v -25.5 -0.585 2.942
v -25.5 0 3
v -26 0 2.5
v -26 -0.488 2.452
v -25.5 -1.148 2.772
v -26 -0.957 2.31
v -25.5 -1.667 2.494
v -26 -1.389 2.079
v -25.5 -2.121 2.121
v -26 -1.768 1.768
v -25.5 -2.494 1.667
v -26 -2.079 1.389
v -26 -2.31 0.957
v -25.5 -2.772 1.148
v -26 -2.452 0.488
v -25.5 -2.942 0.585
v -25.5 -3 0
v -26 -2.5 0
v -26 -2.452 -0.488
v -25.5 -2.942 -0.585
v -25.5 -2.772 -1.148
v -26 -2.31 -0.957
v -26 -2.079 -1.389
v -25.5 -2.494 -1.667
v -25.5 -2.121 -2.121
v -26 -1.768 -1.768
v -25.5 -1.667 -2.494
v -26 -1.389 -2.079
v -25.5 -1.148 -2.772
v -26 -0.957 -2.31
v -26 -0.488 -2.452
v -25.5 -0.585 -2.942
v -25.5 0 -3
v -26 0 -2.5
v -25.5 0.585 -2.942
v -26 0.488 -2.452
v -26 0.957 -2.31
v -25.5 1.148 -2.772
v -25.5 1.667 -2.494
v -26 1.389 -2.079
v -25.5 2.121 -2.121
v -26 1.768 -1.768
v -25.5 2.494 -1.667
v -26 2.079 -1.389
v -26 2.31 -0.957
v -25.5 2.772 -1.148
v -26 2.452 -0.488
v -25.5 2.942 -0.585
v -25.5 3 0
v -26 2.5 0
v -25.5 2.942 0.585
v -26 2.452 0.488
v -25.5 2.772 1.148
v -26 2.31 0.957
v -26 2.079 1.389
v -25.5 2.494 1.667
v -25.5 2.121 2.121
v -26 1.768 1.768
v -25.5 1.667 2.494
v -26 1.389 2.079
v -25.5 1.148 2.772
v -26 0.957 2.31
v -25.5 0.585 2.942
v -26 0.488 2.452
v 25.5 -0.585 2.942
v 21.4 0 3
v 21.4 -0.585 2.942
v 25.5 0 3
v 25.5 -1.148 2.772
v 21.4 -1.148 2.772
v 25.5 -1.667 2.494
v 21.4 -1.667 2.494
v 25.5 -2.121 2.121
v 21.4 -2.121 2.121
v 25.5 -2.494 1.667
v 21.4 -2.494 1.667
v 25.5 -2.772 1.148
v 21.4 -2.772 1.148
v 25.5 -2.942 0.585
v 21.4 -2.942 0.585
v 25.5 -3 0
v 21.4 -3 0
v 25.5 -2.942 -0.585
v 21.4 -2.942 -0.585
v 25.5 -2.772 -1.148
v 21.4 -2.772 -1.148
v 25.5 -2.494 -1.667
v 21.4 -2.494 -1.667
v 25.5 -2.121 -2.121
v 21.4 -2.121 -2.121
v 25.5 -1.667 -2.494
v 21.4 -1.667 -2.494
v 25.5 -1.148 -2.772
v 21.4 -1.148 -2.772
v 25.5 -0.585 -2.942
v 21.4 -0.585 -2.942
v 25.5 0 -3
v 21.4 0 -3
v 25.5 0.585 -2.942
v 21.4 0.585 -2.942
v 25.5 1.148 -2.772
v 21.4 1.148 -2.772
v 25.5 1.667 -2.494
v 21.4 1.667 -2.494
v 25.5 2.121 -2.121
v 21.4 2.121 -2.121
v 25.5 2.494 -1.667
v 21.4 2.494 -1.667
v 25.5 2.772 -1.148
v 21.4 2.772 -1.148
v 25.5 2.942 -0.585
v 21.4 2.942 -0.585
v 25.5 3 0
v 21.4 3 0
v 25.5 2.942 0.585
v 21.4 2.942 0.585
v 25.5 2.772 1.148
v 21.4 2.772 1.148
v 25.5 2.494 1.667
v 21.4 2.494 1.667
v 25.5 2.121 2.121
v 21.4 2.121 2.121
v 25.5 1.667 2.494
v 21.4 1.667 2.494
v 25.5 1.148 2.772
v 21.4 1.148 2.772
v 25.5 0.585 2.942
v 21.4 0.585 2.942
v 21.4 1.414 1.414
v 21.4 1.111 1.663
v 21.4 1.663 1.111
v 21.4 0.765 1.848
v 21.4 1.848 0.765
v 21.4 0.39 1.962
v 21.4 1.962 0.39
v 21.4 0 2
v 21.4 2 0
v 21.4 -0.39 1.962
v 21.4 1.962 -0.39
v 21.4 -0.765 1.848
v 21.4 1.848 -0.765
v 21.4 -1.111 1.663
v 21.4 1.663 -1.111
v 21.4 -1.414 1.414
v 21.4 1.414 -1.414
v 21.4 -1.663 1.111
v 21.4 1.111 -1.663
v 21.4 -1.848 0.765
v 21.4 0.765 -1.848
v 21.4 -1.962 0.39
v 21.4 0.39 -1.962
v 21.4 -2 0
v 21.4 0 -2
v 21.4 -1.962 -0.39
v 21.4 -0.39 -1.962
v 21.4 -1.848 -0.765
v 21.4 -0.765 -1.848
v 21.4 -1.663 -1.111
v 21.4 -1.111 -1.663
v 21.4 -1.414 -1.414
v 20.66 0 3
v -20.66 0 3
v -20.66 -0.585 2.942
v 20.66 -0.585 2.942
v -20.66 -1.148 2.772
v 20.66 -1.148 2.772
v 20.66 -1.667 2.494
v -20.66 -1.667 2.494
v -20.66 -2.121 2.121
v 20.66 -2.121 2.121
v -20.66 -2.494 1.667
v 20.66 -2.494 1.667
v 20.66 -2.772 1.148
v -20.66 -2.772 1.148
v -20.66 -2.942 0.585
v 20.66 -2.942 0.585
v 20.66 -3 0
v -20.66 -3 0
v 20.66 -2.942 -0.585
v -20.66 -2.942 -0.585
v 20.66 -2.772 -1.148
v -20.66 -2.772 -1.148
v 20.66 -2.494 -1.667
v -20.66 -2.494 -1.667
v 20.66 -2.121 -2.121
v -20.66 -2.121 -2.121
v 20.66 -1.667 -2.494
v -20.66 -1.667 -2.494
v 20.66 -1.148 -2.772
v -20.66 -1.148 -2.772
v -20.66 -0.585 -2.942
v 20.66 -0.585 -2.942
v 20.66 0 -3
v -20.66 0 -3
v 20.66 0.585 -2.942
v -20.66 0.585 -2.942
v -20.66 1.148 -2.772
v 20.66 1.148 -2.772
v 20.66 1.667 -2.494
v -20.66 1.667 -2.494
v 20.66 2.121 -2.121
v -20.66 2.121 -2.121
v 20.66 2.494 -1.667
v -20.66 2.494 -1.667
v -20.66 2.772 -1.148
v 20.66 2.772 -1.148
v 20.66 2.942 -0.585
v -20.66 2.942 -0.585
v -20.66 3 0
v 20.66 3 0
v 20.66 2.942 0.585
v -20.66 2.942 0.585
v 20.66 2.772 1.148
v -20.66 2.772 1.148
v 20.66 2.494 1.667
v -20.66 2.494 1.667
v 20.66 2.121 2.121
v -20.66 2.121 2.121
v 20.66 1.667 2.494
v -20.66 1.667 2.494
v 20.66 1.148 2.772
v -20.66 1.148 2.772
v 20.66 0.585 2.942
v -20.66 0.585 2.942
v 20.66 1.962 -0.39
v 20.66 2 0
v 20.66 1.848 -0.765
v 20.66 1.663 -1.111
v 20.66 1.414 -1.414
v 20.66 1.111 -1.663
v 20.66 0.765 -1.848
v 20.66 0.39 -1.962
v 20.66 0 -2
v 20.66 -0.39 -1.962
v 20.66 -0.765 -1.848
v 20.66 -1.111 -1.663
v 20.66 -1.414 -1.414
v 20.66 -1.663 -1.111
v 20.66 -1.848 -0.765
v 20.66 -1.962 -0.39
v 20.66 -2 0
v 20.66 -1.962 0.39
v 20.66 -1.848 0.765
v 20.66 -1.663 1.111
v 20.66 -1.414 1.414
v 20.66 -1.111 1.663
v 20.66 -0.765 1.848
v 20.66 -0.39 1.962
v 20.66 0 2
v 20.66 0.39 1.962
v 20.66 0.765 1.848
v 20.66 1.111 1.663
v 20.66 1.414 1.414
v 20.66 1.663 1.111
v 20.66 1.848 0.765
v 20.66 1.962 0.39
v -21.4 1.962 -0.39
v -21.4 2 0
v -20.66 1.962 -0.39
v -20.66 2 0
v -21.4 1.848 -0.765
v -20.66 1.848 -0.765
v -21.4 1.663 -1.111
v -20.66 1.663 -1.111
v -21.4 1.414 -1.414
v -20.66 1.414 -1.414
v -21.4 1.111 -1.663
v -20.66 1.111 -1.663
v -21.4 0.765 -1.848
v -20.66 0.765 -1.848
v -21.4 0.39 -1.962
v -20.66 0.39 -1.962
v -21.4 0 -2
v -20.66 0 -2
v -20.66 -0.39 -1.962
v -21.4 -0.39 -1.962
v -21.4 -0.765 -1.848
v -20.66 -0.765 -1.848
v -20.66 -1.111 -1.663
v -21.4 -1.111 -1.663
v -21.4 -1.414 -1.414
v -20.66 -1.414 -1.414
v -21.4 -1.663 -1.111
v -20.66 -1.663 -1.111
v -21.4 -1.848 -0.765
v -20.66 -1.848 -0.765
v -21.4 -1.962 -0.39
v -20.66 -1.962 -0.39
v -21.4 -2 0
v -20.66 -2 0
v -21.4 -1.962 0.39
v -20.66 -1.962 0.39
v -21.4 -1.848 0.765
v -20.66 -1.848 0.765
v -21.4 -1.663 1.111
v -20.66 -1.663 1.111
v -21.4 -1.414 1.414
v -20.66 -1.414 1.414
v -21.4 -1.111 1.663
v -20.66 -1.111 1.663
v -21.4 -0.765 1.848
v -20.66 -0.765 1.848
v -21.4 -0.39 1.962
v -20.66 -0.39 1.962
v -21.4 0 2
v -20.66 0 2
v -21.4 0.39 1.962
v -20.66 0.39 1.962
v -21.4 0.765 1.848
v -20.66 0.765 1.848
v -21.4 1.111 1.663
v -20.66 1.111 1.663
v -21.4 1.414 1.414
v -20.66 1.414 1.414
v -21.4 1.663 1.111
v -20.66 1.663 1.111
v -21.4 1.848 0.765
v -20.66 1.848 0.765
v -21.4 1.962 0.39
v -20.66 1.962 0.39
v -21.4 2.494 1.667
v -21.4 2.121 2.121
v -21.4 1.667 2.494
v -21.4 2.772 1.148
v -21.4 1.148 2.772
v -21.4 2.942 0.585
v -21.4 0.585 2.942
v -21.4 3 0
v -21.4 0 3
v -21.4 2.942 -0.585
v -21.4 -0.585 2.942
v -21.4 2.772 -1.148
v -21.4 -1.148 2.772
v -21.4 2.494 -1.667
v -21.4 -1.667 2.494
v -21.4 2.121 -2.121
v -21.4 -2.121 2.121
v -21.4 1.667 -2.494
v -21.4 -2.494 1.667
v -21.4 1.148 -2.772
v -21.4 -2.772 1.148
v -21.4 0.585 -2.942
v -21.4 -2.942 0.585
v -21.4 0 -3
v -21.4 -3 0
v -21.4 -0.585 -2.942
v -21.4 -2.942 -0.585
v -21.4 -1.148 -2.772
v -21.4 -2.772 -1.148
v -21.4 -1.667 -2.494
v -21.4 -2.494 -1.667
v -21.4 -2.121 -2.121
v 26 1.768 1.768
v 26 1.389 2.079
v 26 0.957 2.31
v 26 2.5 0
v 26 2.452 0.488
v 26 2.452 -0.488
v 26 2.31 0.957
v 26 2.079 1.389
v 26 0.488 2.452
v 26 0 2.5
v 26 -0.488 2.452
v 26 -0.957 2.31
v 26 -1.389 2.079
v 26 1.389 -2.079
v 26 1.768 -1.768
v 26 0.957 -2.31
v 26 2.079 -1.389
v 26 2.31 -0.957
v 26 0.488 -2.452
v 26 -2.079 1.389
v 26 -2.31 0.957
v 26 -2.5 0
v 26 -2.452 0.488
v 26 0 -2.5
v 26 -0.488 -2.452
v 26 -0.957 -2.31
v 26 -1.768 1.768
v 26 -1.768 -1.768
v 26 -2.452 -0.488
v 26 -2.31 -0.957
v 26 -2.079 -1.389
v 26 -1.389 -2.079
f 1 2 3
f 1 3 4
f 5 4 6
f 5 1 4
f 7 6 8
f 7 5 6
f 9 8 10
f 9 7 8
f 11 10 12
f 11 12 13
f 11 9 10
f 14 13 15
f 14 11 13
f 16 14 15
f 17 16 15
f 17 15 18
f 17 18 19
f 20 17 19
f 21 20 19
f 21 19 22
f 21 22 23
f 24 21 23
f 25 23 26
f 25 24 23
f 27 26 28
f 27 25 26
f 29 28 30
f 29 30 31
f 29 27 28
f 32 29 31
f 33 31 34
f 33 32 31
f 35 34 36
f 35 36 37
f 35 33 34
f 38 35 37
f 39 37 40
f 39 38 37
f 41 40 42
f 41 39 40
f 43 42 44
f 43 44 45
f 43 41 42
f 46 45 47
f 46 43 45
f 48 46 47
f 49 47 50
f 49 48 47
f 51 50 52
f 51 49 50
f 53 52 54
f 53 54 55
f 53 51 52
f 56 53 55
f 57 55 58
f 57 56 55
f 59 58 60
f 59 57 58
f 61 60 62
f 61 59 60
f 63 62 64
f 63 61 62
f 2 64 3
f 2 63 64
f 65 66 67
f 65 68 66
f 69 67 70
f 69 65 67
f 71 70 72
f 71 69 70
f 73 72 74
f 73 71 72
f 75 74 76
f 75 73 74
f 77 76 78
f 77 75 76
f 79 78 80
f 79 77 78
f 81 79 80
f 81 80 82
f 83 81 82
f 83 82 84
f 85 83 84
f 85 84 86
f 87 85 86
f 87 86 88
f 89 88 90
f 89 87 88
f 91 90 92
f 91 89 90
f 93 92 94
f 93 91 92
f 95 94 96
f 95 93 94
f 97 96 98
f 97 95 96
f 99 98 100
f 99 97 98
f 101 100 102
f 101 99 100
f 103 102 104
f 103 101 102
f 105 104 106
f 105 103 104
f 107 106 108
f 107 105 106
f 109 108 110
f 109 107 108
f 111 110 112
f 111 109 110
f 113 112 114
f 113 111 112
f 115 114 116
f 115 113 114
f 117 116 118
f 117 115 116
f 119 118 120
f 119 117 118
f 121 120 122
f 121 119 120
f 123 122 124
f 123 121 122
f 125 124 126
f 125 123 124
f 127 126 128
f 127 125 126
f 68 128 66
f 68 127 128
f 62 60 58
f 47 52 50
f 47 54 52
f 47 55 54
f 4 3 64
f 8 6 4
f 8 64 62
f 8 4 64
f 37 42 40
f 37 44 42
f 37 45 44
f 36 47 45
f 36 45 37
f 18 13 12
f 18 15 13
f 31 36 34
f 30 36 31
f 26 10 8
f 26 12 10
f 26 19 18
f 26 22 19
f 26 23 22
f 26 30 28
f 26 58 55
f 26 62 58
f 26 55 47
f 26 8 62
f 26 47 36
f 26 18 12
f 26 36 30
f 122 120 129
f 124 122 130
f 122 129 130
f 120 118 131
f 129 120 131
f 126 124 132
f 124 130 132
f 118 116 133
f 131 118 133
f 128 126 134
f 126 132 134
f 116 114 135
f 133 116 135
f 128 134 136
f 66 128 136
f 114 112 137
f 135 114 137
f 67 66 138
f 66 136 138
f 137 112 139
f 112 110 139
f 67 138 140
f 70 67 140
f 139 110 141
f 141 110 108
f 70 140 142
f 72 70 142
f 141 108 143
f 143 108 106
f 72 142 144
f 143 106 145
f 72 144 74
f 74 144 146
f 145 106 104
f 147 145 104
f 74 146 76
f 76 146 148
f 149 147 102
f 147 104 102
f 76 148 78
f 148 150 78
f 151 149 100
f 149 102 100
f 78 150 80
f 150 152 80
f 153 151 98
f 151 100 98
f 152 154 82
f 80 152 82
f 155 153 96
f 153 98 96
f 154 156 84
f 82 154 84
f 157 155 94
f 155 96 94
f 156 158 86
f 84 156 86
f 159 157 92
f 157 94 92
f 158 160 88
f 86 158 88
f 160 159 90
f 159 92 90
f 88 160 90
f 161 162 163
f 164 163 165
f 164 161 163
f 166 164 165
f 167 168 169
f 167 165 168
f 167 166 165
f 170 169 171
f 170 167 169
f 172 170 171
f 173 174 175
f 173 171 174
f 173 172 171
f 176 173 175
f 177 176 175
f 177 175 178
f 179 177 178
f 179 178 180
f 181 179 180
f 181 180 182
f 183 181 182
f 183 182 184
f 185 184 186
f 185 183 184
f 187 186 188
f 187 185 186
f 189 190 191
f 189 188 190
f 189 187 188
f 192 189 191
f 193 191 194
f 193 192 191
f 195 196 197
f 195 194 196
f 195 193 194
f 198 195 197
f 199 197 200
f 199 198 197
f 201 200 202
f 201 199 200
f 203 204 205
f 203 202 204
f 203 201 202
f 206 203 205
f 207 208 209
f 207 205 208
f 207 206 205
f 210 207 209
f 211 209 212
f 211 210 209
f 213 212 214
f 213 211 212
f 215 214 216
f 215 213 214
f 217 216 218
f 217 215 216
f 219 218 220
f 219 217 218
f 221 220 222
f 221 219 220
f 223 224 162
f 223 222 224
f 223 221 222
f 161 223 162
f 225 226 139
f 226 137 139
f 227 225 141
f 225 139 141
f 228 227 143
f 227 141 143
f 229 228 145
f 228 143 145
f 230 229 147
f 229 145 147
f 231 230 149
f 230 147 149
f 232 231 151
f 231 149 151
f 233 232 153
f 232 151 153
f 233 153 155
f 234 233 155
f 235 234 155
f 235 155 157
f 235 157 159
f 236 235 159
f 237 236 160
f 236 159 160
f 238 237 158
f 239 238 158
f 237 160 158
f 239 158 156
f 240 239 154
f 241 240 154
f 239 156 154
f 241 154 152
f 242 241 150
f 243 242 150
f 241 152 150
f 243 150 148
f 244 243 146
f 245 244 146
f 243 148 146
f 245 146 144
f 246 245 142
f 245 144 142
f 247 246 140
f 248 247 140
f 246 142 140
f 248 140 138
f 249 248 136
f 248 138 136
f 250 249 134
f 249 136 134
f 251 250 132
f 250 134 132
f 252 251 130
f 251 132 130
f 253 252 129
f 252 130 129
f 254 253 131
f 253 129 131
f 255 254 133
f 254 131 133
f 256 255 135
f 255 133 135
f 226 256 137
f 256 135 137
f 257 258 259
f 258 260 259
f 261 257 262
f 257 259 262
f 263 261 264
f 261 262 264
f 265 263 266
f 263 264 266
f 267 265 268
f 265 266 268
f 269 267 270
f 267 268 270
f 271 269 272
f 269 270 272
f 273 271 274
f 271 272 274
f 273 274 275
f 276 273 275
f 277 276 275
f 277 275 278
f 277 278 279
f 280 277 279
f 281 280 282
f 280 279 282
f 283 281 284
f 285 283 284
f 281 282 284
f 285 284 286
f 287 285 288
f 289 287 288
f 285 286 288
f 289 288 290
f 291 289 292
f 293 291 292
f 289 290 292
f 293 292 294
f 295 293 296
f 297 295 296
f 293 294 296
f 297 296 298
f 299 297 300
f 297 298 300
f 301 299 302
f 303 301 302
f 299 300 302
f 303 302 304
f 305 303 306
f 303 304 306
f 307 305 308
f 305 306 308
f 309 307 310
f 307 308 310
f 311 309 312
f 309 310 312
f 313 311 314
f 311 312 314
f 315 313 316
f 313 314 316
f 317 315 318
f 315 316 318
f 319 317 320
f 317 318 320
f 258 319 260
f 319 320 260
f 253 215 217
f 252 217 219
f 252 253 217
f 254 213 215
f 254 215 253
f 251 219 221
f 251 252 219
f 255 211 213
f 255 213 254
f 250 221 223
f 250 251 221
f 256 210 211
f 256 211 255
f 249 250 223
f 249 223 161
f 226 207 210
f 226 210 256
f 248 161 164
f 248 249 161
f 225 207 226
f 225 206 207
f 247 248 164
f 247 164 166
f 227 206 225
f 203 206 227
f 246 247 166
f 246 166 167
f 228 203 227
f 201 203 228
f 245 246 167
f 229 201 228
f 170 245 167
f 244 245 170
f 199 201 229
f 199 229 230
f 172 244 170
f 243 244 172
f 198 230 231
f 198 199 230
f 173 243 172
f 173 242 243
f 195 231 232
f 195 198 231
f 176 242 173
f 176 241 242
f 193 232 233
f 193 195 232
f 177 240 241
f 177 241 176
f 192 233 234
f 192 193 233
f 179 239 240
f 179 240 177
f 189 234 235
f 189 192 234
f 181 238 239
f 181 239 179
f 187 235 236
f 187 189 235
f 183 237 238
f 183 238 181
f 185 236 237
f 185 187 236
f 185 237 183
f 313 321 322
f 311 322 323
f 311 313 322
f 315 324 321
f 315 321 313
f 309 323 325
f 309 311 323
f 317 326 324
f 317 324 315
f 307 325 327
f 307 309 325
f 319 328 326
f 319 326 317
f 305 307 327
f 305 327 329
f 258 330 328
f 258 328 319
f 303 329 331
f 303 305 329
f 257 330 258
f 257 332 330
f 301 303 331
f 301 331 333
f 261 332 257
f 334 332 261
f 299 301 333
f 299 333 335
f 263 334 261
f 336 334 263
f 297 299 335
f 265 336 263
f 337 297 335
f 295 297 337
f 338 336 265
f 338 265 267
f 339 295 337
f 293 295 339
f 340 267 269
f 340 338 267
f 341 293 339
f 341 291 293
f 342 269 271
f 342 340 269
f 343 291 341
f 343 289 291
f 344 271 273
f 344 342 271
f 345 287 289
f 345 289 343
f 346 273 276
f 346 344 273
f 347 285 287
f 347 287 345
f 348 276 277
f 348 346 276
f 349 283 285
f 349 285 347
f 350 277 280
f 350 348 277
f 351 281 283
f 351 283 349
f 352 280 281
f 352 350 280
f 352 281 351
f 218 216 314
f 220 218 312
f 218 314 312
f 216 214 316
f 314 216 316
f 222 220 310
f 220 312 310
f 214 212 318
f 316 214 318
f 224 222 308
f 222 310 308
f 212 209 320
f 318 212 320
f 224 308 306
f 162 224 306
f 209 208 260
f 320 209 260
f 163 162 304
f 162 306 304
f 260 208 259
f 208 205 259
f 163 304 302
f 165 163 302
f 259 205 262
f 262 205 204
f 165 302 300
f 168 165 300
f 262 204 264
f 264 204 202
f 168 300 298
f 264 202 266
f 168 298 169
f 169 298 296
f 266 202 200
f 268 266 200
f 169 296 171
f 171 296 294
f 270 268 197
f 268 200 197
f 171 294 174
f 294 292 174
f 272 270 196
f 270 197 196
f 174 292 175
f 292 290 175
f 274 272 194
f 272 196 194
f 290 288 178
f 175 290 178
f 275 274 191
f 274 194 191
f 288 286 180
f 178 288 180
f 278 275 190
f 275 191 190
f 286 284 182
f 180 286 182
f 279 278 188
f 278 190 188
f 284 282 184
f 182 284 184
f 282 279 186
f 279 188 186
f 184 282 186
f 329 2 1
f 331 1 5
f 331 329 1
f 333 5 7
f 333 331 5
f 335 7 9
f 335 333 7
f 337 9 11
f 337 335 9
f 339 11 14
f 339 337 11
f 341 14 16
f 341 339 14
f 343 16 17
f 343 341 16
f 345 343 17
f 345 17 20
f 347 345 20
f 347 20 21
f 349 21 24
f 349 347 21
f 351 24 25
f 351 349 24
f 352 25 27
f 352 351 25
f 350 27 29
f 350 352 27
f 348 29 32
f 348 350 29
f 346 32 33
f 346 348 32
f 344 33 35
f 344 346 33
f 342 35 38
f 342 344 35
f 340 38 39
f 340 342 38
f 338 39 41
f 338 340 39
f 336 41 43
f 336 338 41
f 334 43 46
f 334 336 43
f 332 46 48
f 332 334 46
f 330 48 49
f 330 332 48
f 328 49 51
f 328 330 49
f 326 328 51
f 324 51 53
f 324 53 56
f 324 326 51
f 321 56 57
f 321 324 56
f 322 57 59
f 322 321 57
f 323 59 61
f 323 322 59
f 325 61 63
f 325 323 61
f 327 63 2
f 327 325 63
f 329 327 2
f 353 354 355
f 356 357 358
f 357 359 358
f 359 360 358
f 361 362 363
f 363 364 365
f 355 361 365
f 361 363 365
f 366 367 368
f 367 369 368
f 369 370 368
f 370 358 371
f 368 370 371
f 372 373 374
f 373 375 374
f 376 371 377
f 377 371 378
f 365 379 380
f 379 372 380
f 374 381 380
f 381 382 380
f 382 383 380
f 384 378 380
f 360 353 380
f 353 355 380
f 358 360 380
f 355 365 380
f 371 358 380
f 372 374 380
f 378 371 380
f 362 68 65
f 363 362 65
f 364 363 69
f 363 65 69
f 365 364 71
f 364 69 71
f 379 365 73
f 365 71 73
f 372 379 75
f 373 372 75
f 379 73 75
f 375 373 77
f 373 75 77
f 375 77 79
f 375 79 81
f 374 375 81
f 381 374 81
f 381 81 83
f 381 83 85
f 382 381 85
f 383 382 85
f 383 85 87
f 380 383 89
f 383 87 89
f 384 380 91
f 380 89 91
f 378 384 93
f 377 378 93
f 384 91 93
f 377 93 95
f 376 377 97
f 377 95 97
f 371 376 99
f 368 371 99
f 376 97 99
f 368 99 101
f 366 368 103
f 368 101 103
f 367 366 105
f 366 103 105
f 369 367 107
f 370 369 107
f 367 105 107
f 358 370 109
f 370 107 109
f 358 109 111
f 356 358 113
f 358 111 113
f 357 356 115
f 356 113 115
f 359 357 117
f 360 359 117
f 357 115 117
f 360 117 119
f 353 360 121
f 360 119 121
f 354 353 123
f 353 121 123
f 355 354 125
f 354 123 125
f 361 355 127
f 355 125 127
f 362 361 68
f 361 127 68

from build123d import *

# Parameters (mm, degrees)
ESQUISSE1_W     = 52
ESQUISSE1_H     = 3
CHANFREIN1_SIZE = 0.5
ESQUISSE3_W     = 0.74
ESQUISSE3_H     = 1


with BuildPart() as part:
    # Esquisse1 → Révolution1 (revolve)
    with BuildSketch(Plane.XY, mode=Mode.PRIVATE) as r_volution1_sk:
        with Locations((0, 1.5)):
            Rectangle(ESQUISSE1_W, ESQUISSE1_H)
    revolve(r_volution1_sk.sketch.rotate(Axis((0, 0, 0), (1, 0, 0)), 90), axis=Axis((0, 0, 0), (1, 0, 0)))

    # Chanfrein1
    chanfrein1_edges = [part.edges().sort_by_distance(p)[0] for p in [
        (26, 0, -3),
        (-26, 0, -3),
    ]]
    chamfer(chanfrein1_edges, length=CHANFREIN1_SIZE)

    # Esquisse3 → Enlèvement de matière-Révolution1 (revolve, cut)
    with BuildSketch(Plane.XY):
        with Locations((-21.03, 2.5)):
            Rectangle(ESQUISSE3_W, ESQUISSE3_H)
        with Locations((21.03, 2.5)):
            Rectangle(ESQUISSE3_W, ESQUISSE3_H)
    revolve(axis=Axis((0, 0, 0), (-1, 0, 0)), mode=Mode.SUBTRACT)


solid = part.part
